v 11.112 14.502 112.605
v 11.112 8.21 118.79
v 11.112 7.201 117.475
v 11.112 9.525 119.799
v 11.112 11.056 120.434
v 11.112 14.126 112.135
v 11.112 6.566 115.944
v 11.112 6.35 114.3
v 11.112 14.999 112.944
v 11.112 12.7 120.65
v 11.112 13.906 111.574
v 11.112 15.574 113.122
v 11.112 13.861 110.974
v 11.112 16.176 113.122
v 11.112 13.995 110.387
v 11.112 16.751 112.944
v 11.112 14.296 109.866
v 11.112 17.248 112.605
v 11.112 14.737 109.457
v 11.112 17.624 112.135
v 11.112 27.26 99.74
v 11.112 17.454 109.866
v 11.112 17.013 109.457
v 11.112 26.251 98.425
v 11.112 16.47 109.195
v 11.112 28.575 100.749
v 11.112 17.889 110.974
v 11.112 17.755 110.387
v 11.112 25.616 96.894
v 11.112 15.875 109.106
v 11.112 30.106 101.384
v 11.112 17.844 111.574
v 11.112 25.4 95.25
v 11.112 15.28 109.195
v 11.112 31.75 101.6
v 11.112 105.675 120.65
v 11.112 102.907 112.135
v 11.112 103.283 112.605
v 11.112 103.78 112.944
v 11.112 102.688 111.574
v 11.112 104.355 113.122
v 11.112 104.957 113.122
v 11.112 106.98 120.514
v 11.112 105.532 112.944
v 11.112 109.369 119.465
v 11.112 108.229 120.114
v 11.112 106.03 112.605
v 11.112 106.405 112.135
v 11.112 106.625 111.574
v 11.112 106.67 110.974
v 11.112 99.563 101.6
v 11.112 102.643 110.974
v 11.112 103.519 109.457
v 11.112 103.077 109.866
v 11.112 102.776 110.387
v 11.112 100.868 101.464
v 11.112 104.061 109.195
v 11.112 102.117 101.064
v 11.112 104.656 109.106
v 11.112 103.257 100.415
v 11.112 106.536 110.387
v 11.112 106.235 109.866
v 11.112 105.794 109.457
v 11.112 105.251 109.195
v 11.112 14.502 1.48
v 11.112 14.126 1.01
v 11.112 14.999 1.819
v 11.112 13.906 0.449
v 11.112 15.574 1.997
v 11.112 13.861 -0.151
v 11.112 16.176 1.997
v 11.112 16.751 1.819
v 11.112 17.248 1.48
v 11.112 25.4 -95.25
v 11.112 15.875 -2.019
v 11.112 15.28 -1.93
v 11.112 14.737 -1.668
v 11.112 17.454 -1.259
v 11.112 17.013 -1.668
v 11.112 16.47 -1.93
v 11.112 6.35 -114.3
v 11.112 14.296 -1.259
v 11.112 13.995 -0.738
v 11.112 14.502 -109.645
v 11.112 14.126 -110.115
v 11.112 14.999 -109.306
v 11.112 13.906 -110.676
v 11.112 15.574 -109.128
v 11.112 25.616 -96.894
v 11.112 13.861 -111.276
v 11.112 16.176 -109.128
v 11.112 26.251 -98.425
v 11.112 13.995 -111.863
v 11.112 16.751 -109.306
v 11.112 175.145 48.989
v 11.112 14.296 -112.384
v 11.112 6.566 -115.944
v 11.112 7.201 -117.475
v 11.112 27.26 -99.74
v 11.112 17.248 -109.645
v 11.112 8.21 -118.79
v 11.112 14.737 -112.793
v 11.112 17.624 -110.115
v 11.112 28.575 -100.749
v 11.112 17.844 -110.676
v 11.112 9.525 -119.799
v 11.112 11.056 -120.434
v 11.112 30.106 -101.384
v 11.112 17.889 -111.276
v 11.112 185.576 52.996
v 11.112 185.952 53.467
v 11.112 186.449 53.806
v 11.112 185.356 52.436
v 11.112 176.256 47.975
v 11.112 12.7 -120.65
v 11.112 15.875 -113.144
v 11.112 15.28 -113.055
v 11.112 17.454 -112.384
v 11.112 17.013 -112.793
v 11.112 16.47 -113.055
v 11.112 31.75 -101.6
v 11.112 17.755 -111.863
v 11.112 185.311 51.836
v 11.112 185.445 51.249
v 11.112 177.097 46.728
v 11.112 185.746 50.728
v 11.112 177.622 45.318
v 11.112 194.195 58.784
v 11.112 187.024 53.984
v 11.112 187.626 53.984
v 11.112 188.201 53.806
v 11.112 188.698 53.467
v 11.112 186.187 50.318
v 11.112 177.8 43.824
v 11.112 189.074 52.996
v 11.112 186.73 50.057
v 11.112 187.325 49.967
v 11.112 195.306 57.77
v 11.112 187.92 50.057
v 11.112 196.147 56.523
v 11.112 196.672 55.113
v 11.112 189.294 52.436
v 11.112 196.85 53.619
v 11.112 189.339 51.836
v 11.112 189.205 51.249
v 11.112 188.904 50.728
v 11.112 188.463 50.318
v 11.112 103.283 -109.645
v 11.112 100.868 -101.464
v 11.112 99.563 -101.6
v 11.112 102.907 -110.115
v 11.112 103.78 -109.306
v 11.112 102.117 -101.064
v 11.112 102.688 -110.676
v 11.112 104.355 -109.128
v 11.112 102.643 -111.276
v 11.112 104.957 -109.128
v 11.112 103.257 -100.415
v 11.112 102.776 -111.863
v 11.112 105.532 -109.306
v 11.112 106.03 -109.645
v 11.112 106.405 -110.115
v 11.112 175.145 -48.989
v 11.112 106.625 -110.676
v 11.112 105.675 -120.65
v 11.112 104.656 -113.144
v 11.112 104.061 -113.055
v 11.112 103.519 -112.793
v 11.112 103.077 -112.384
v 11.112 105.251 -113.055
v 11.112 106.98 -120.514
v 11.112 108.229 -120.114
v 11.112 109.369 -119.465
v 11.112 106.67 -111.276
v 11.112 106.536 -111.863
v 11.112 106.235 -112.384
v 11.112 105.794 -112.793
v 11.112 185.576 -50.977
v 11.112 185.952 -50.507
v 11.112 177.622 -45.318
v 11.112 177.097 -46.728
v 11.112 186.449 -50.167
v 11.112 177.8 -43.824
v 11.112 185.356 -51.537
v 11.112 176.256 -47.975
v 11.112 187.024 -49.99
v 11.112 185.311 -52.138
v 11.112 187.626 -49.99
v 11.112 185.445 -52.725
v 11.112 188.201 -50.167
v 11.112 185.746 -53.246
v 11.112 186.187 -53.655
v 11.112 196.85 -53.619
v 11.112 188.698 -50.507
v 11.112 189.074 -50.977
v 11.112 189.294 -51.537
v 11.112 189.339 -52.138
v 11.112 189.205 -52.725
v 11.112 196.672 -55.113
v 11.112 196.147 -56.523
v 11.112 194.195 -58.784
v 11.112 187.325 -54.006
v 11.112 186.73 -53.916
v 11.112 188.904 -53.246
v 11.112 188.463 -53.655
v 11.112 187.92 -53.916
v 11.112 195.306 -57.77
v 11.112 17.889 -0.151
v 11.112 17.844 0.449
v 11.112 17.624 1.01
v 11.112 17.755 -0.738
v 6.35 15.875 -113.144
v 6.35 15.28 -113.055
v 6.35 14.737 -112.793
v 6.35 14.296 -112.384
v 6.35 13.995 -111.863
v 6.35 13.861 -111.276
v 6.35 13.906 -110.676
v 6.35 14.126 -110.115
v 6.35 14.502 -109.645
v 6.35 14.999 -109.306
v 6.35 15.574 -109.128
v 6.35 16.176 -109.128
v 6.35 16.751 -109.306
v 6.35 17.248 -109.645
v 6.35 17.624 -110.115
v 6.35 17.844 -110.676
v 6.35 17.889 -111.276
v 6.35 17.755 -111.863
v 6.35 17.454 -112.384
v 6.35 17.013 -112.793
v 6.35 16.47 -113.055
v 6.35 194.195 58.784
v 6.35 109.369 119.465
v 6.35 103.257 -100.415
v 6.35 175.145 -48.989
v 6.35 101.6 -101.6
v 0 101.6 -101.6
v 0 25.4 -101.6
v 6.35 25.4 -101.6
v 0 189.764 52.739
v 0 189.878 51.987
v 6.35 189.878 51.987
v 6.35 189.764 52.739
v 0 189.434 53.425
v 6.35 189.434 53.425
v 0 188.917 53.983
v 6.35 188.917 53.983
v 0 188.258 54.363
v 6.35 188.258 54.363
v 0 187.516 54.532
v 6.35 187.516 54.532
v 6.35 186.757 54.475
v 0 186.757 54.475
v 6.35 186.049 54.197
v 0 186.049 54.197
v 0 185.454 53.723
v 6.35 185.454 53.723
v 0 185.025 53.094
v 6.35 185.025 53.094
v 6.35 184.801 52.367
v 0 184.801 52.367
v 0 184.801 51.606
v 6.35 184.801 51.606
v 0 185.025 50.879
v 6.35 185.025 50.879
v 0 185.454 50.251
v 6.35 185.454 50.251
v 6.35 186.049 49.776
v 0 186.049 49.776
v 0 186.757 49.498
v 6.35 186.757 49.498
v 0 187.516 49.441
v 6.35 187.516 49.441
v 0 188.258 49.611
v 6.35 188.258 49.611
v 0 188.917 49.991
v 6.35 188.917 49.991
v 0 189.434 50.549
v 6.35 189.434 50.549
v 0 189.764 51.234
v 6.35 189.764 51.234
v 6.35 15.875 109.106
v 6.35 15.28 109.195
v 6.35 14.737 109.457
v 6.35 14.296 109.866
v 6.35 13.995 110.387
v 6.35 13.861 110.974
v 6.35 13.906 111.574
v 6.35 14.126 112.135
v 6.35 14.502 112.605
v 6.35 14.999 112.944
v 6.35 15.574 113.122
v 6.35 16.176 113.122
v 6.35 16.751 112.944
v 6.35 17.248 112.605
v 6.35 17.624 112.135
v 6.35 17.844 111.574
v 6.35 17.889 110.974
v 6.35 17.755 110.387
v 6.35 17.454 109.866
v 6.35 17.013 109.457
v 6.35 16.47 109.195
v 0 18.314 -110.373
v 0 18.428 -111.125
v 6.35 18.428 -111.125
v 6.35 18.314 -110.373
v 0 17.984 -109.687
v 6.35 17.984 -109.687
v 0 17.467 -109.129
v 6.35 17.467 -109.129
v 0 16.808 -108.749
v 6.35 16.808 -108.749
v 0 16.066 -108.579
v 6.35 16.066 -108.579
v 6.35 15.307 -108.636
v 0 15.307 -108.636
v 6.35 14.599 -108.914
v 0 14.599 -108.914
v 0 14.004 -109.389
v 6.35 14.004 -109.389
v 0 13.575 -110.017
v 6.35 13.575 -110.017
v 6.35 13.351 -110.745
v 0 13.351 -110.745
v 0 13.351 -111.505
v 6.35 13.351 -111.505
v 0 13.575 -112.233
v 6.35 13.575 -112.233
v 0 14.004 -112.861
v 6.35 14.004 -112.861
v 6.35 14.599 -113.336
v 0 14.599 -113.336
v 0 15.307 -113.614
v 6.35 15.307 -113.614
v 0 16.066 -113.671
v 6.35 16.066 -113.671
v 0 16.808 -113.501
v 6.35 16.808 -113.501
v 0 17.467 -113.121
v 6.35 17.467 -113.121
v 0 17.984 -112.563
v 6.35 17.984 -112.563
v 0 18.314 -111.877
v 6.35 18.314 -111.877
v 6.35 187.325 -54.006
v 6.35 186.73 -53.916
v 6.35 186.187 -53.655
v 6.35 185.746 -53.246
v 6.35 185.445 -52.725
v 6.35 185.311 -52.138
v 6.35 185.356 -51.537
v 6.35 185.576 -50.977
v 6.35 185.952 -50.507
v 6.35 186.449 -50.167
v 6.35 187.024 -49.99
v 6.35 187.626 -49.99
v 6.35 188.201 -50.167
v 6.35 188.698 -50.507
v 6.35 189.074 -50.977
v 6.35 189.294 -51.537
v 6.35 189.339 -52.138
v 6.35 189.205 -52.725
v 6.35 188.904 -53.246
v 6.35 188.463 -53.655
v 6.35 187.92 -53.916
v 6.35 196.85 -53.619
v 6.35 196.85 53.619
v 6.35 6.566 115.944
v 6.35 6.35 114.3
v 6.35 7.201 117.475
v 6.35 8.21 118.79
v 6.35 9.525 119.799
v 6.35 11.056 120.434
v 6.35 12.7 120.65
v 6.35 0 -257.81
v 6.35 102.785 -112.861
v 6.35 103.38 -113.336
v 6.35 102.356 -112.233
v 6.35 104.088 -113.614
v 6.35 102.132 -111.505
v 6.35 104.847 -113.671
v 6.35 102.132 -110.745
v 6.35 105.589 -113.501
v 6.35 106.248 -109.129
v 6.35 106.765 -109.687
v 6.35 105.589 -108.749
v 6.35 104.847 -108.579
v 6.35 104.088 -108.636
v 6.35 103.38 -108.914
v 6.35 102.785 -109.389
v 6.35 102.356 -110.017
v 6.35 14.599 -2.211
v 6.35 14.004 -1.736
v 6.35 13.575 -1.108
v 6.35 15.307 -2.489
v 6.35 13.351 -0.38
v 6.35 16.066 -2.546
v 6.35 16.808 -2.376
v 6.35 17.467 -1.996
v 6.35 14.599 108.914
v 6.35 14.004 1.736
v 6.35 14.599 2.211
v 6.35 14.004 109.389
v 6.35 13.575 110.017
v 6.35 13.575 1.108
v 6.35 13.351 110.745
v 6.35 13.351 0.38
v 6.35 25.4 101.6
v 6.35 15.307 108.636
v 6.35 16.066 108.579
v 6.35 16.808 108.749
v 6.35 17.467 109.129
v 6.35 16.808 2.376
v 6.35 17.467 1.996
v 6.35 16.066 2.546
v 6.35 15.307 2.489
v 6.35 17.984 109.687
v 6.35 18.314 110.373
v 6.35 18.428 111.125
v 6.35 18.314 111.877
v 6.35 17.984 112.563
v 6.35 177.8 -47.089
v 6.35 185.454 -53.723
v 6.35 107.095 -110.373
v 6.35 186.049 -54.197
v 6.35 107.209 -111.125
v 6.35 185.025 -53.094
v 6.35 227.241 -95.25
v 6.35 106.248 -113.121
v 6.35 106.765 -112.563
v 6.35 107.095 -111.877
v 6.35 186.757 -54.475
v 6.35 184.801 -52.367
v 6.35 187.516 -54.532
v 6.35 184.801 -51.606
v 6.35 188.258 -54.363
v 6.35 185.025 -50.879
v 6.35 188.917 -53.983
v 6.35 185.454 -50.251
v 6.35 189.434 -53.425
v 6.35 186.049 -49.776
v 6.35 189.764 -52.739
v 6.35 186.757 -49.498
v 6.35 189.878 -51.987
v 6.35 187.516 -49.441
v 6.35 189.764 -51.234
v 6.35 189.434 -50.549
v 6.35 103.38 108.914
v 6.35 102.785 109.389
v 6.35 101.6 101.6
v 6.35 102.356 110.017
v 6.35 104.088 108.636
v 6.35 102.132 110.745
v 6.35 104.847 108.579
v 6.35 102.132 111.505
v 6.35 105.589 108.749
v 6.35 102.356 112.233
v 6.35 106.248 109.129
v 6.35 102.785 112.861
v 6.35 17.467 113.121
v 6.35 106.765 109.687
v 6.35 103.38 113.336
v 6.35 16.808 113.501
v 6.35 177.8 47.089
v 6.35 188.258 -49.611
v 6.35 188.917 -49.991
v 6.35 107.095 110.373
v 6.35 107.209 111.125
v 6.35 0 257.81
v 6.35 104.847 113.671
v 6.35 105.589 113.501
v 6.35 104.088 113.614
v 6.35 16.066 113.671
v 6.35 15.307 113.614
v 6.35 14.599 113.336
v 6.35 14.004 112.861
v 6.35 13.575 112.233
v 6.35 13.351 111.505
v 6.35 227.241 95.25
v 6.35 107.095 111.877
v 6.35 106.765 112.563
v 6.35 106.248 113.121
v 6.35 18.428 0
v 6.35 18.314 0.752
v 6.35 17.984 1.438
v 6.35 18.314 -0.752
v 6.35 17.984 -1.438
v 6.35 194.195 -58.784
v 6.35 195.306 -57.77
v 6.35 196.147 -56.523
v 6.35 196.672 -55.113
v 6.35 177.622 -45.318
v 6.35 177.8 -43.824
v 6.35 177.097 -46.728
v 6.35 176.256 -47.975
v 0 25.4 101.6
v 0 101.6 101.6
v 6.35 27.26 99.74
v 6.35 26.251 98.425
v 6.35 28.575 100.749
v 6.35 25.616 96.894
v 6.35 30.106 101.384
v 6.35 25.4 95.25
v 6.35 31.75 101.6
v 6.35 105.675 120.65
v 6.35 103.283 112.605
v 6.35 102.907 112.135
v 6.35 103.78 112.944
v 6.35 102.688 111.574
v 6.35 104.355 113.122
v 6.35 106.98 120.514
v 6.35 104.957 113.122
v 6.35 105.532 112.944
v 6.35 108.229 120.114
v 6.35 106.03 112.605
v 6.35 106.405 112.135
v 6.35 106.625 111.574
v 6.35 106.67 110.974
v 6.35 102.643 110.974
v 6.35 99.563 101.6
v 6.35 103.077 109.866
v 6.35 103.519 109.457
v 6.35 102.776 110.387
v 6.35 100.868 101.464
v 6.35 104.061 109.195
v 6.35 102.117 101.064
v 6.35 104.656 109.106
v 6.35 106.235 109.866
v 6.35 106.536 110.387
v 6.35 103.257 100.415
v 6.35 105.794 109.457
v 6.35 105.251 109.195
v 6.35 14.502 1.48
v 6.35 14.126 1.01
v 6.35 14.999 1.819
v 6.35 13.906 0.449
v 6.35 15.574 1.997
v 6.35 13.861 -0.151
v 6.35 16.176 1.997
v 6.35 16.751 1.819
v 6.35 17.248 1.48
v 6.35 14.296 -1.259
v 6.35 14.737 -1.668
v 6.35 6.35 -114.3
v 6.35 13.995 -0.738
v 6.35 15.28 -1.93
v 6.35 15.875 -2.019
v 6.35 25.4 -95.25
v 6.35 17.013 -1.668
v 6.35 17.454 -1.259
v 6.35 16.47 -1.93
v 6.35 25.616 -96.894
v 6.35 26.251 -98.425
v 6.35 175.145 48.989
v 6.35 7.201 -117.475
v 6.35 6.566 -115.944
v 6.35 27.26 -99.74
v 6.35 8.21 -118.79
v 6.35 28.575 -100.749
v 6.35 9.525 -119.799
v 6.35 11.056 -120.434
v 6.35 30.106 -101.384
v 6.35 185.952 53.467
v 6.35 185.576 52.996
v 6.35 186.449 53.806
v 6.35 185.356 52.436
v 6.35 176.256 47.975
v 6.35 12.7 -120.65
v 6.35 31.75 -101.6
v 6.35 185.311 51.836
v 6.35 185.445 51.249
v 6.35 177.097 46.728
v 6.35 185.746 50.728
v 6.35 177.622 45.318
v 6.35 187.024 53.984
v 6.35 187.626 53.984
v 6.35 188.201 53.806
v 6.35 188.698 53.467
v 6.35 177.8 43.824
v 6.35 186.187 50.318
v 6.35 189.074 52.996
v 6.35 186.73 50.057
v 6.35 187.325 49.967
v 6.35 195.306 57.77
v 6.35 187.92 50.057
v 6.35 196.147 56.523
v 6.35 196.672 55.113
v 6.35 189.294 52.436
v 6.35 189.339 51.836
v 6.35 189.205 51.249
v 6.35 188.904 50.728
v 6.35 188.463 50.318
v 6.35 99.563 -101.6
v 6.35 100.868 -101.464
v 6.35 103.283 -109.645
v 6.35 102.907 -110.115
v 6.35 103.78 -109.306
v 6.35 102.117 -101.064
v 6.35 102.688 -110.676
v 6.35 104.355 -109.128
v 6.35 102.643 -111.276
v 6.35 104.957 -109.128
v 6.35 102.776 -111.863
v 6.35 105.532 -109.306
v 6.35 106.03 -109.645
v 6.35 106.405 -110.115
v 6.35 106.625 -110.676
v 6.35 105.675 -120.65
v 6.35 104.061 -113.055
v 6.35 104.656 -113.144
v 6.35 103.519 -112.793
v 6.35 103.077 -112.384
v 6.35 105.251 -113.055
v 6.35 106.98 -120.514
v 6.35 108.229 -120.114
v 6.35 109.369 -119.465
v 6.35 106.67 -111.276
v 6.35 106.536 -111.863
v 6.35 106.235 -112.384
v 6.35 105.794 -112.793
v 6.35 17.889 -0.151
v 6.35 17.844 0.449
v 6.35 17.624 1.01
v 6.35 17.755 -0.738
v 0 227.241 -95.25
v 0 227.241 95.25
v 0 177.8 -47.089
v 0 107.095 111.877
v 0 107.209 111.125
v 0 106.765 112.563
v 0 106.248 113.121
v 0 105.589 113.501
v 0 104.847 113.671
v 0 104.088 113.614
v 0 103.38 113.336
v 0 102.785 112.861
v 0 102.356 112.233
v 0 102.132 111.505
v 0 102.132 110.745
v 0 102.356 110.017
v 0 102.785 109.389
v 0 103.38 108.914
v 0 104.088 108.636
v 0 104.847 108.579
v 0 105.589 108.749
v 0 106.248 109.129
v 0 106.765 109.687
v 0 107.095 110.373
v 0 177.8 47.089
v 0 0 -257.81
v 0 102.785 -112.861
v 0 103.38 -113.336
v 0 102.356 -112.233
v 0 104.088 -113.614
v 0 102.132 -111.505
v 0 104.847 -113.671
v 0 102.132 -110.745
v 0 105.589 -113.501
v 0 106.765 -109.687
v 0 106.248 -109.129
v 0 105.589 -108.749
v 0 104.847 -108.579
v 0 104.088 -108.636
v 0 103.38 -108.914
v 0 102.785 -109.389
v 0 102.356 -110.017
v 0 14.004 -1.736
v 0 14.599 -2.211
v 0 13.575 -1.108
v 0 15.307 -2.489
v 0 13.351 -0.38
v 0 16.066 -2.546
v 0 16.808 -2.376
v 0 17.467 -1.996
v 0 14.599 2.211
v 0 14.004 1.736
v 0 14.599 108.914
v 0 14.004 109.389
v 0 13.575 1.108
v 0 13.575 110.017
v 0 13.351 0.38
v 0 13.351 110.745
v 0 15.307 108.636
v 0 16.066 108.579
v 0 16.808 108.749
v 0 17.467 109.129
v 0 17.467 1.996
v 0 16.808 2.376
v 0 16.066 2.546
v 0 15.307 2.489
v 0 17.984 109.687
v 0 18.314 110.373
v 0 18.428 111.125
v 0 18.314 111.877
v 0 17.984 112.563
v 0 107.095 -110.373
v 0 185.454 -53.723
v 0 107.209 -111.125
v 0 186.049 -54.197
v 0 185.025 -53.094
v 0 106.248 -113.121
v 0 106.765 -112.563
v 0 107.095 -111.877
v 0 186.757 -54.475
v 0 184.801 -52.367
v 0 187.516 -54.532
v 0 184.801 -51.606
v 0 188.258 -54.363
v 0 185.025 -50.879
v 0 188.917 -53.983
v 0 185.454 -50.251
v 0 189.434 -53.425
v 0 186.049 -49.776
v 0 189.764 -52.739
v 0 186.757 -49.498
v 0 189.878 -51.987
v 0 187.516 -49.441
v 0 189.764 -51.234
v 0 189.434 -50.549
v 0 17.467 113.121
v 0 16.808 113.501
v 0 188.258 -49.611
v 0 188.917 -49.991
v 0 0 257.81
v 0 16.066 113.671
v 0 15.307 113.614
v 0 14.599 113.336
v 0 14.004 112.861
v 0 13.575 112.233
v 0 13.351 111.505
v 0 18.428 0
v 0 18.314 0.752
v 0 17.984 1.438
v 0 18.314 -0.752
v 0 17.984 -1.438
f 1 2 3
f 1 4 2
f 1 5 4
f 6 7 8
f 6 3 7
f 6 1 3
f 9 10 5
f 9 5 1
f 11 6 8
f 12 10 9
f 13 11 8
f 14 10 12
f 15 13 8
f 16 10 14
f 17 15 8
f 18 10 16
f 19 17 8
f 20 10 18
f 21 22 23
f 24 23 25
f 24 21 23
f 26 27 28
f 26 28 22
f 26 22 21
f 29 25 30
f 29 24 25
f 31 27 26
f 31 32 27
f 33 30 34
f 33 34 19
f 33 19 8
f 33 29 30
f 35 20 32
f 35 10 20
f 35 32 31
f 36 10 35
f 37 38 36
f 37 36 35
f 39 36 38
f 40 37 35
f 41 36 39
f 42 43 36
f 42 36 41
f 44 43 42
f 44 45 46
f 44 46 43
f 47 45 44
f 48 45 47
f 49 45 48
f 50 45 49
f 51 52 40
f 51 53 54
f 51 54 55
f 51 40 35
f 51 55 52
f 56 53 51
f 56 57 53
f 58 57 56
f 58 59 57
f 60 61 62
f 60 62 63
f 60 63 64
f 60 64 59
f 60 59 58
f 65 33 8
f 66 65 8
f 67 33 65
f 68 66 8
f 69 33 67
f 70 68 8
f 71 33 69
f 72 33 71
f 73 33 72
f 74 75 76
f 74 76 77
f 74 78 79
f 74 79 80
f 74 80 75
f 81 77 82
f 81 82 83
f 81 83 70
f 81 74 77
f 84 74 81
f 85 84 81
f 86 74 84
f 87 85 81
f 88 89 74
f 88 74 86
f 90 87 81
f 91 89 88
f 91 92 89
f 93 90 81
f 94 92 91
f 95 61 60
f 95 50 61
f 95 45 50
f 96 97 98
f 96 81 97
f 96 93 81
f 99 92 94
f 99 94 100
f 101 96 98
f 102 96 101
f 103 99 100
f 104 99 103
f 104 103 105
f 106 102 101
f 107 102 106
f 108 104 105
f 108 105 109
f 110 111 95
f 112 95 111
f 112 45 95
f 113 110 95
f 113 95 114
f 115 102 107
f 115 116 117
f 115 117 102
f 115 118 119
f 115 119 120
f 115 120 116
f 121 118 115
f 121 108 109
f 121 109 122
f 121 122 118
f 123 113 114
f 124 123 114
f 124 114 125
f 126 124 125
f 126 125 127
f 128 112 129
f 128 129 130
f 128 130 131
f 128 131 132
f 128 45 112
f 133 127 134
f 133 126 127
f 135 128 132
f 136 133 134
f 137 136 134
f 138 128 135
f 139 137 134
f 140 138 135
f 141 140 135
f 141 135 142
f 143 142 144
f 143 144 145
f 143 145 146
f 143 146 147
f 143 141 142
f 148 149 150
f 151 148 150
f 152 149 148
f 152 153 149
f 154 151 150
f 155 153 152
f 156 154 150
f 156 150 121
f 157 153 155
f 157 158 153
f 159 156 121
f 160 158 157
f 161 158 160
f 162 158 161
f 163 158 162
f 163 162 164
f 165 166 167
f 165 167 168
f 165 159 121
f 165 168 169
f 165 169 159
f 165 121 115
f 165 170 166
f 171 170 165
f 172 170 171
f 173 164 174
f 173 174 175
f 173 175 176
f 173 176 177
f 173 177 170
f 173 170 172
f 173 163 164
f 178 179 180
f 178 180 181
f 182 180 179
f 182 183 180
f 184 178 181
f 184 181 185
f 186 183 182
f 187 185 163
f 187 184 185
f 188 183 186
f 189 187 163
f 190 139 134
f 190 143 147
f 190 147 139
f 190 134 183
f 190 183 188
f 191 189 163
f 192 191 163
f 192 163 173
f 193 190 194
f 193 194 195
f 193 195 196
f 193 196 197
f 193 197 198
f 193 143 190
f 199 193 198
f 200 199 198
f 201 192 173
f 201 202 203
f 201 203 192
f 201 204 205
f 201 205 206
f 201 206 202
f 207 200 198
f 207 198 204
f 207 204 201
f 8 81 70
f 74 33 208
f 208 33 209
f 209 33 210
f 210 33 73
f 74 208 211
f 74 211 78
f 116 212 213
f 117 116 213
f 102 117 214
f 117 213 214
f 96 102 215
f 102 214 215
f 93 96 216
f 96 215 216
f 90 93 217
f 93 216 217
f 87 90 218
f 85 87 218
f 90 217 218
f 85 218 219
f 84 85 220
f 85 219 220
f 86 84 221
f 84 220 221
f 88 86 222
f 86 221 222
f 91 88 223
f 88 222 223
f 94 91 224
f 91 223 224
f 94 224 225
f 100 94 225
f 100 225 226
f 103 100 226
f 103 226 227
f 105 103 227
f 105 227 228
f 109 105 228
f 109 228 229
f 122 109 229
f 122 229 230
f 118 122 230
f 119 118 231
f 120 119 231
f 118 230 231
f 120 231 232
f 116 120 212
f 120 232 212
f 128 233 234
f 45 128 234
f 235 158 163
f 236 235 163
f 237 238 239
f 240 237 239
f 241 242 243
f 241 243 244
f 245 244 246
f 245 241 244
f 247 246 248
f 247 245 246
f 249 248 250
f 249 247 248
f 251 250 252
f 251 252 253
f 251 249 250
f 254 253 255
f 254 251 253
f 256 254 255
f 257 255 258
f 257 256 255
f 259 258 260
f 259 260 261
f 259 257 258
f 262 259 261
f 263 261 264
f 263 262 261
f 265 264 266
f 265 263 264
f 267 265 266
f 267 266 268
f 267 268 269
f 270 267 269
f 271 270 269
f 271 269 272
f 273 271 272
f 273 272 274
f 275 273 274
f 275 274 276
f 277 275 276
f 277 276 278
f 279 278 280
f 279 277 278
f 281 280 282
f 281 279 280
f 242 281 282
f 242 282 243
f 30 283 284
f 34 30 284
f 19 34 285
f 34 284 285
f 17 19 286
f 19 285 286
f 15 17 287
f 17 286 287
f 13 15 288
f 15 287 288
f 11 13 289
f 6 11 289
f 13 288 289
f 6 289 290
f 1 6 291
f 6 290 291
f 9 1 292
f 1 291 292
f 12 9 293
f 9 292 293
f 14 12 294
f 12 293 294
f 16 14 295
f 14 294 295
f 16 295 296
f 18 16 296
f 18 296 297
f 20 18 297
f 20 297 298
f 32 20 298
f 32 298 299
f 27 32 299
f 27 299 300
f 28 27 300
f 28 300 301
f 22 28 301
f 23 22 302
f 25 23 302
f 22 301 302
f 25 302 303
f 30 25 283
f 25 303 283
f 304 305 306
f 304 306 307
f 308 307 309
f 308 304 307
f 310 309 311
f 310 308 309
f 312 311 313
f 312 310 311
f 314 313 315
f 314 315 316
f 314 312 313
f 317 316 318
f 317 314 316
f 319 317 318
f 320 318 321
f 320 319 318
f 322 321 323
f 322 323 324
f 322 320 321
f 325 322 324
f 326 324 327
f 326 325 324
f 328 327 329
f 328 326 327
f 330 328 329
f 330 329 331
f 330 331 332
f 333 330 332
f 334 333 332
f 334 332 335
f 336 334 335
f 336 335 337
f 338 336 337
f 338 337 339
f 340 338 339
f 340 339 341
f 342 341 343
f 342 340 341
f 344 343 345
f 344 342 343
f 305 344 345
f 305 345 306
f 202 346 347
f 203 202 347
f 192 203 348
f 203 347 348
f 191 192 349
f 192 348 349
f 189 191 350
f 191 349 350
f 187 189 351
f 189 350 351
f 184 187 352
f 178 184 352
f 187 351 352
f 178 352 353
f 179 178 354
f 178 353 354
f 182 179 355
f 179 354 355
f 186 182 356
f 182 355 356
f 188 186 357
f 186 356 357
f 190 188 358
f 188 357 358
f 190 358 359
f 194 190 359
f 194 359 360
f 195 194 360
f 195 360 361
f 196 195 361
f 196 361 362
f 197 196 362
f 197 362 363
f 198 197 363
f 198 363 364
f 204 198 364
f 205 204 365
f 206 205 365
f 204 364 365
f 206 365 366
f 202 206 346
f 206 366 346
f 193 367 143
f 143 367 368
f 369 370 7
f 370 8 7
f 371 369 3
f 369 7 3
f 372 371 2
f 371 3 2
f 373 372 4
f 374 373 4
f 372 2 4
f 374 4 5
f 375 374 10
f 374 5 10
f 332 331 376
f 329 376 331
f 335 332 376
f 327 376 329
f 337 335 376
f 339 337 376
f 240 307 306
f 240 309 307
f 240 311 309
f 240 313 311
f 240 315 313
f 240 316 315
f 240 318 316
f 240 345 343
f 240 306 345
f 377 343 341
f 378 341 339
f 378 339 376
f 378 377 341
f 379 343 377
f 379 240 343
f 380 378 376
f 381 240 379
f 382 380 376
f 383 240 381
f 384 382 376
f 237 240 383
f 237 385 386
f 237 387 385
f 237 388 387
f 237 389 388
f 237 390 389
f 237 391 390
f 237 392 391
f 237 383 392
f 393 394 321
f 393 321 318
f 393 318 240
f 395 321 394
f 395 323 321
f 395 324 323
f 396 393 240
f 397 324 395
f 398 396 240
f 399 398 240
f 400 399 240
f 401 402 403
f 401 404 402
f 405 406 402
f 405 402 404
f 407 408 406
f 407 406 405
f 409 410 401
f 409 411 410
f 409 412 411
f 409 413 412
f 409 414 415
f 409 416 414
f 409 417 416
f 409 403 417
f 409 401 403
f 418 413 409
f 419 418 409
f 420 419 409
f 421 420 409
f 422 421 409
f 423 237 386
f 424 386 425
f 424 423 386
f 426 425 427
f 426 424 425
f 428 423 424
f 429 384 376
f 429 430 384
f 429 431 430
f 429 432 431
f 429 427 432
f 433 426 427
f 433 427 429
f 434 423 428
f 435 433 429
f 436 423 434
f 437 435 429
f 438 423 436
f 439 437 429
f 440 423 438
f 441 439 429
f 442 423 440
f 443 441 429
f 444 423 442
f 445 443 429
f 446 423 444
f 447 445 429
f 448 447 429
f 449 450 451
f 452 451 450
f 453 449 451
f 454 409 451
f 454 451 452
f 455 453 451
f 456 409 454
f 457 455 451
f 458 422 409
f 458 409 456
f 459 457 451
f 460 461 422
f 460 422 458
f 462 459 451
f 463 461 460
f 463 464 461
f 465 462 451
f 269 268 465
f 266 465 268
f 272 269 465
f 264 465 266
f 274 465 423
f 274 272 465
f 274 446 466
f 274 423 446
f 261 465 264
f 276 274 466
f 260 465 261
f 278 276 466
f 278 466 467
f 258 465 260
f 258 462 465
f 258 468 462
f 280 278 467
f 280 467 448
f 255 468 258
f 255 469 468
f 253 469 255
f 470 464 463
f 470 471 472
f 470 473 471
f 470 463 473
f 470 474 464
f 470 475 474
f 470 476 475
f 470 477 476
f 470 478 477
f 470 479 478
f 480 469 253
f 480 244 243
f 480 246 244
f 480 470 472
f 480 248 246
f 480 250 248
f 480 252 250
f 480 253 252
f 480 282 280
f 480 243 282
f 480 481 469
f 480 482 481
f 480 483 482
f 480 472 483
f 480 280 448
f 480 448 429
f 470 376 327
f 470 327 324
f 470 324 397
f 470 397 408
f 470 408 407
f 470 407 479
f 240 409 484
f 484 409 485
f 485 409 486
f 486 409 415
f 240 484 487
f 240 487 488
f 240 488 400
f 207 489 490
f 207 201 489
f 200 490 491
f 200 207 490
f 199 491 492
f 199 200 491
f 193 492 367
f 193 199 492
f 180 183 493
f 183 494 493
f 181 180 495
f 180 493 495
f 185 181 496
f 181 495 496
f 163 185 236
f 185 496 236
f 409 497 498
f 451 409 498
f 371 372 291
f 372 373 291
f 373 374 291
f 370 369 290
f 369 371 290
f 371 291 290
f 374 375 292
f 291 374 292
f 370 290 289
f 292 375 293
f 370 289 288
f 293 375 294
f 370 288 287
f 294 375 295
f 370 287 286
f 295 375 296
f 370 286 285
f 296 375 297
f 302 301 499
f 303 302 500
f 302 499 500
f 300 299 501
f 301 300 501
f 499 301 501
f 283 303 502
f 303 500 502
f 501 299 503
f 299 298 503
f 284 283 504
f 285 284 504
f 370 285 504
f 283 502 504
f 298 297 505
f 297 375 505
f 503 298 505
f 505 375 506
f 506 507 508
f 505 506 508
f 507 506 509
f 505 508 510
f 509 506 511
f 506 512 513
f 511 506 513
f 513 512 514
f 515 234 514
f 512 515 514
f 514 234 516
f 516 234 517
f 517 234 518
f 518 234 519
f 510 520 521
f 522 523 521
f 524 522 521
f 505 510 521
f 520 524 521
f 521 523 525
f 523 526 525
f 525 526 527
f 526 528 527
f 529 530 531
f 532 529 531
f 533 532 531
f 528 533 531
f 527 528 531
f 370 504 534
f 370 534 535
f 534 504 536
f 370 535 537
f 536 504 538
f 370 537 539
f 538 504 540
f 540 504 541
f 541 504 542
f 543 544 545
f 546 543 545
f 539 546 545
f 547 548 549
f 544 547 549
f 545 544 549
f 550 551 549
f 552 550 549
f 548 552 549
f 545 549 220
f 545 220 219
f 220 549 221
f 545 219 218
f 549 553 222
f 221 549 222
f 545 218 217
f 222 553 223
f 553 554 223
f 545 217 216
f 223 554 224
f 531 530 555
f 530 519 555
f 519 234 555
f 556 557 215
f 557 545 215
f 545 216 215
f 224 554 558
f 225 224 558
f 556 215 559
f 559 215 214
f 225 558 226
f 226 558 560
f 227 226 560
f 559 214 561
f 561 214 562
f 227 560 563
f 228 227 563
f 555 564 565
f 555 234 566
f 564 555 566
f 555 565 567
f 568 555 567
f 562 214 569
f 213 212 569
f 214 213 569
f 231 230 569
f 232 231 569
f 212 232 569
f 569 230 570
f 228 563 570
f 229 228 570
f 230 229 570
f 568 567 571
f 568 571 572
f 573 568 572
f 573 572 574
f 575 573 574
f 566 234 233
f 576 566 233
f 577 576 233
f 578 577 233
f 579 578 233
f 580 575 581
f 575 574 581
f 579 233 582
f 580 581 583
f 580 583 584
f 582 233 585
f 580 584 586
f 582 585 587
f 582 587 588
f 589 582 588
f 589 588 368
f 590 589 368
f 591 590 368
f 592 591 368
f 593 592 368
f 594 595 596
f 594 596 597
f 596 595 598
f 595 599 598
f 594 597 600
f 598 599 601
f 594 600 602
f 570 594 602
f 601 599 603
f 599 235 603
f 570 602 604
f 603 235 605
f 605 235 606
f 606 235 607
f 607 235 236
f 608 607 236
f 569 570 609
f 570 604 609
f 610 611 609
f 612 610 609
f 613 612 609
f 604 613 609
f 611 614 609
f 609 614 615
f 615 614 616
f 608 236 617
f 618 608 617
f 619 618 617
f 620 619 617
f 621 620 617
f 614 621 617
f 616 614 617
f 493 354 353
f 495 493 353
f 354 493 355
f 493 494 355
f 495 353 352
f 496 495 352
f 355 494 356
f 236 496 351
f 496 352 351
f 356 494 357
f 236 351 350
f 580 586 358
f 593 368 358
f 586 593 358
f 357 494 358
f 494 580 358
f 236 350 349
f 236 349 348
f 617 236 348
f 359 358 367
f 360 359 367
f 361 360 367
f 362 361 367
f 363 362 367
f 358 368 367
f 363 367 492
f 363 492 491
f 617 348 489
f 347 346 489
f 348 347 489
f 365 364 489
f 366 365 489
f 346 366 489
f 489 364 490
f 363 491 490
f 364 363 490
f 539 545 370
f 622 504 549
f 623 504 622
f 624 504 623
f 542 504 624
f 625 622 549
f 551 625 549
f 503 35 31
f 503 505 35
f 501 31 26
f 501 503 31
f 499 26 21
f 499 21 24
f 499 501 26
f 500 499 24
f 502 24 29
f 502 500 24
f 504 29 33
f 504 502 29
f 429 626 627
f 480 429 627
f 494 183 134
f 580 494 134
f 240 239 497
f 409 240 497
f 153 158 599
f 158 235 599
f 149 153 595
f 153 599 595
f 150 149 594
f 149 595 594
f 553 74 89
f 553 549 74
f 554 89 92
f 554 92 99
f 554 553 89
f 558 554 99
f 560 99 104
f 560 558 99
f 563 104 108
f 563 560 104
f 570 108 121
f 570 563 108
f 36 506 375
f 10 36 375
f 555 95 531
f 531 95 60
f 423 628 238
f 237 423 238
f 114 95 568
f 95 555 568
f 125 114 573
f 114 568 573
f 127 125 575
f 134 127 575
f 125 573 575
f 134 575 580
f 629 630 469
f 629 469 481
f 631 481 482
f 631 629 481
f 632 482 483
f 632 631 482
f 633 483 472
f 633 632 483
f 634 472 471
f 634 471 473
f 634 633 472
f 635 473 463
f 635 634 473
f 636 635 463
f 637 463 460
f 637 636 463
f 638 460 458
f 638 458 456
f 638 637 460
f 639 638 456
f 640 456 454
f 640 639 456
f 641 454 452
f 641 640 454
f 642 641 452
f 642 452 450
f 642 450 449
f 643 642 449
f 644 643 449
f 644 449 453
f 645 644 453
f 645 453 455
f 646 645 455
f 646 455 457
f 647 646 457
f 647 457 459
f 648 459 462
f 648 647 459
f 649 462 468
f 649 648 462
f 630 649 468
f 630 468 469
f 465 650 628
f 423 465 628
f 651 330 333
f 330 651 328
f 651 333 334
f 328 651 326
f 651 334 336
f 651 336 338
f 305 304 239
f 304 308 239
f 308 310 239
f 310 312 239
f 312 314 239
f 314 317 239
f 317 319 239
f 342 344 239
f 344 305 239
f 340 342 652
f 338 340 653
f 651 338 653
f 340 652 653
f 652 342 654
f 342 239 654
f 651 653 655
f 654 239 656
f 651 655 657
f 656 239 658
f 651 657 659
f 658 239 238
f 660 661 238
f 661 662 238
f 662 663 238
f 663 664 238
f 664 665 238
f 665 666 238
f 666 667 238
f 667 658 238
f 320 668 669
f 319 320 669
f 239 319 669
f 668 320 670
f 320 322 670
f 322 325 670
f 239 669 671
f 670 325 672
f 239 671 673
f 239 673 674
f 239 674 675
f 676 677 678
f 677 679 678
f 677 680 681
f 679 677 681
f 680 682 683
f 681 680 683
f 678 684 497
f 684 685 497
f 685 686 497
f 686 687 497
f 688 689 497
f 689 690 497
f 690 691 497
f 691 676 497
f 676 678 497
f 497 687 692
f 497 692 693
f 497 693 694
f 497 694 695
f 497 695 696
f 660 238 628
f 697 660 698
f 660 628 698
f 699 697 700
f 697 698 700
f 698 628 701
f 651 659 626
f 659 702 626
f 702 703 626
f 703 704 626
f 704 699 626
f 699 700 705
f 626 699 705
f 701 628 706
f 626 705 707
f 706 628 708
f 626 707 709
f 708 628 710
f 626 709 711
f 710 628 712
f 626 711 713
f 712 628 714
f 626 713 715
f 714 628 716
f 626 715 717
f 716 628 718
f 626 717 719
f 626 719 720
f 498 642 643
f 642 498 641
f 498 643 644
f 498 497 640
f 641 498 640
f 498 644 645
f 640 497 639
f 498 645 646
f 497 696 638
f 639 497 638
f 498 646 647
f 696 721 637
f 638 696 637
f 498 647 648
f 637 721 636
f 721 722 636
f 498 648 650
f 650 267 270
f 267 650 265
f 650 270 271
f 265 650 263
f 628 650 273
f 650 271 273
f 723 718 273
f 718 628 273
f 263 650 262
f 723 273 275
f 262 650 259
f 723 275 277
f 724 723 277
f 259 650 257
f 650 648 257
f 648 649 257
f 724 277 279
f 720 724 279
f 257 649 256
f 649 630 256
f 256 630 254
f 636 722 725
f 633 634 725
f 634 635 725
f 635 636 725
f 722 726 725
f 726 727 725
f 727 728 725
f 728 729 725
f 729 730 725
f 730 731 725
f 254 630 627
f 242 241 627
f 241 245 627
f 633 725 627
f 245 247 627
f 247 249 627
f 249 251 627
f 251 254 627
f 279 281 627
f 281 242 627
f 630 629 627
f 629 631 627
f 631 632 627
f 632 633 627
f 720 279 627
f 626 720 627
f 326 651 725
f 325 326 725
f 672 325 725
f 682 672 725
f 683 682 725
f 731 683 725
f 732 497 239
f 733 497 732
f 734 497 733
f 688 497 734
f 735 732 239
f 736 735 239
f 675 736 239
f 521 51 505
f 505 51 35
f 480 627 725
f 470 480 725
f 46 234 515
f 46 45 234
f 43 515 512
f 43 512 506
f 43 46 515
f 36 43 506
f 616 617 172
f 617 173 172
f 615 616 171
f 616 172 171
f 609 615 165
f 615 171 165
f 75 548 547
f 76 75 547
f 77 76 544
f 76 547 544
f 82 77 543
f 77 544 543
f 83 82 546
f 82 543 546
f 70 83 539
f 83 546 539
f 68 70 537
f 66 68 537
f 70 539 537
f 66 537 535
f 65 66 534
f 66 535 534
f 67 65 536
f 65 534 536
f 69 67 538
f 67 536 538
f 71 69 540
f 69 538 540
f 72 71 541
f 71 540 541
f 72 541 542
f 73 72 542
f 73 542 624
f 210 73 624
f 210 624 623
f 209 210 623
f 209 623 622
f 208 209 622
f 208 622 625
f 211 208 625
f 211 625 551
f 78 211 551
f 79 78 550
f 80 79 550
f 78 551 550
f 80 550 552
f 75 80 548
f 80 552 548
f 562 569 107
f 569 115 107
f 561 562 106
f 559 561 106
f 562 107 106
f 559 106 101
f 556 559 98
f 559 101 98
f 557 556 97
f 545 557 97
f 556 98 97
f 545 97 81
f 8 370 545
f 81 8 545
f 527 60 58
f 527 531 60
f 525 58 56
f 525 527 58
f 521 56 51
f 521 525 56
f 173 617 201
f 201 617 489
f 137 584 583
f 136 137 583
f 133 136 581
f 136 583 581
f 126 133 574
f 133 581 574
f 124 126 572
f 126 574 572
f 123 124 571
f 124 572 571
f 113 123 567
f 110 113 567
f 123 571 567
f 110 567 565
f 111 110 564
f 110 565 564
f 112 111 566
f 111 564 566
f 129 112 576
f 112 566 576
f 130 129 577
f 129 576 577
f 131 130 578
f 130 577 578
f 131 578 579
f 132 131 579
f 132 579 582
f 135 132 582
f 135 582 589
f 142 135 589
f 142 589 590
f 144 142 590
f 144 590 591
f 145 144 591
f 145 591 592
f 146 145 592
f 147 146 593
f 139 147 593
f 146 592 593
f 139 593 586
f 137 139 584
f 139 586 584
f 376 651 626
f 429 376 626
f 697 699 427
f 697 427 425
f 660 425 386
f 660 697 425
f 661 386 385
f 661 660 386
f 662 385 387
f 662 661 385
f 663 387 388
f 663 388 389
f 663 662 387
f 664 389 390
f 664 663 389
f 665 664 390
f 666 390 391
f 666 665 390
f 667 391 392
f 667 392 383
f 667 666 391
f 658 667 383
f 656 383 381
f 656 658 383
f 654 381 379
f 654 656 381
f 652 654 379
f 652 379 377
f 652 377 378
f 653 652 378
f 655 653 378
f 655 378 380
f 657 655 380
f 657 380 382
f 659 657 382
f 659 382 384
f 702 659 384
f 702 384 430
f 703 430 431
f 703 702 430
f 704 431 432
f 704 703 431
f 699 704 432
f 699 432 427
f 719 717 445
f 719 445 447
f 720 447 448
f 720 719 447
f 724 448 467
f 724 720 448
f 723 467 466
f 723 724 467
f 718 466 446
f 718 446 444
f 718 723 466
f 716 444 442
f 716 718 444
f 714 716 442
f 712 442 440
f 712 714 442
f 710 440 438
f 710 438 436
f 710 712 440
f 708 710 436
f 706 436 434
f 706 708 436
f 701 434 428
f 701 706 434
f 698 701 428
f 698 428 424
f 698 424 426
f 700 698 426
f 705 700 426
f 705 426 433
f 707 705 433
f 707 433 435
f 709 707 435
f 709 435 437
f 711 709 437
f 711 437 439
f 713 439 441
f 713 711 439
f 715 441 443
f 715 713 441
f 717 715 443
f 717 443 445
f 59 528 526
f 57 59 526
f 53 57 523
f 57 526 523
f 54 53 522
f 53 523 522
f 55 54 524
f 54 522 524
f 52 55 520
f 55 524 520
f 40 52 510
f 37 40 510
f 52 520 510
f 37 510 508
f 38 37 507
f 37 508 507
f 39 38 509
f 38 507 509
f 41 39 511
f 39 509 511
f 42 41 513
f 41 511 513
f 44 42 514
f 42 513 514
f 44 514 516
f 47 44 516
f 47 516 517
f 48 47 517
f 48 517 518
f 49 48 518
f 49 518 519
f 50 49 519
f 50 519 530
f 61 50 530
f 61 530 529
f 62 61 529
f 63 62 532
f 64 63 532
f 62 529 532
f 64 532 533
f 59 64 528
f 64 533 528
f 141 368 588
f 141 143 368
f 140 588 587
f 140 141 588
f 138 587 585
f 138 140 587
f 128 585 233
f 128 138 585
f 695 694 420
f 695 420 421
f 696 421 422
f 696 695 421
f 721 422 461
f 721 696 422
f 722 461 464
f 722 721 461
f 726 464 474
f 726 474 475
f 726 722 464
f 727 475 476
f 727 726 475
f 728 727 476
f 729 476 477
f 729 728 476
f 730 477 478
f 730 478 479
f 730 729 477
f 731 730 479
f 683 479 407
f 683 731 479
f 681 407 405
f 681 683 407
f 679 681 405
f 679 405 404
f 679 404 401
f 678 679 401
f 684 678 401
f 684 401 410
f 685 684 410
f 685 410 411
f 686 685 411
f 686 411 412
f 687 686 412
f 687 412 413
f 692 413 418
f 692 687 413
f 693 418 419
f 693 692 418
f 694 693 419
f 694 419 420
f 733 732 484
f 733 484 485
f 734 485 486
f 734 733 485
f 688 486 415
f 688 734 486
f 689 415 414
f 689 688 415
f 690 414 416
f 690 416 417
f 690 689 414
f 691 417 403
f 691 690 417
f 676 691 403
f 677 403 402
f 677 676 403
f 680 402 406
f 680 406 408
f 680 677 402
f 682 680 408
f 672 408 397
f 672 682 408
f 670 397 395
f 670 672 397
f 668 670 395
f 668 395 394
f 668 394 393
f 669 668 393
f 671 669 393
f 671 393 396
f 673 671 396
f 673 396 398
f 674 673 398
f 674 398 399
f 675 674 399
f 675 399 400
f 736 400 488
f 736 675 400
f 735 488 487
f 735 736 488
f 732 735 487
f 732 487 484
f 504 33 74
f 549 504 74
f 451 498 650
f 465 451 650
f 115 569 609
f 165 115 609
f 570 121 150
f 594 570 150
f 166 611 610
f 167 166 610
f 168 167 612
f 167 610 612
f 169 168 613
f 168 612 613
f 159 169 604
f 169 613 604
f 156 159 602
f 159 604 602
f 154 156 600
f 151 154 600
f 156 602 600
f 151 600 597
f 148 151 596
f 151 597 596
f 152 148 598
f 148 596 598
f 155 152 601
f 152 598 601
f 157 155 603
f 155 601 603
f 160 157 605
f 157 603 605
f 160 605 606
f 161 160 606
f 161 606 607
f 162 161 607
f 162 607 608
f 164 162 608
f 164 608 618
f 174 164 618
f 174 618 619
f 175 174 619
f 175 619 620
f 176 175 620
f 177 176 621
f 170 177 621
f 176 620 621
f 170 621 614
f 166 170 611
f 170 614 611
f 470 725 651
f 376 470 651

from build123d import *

# Parameters (mm, degrees)
ANGLEDBALLAST_DECKFRONT_OUTLINE_R = 2.5527
ANGLEDBALLAST_DECKFRONT_DEPTH     = 6.35
BOSS_EXTRUDE1_DEPTH               = 4.7625
CUT_EXTRUDE2_DEPTH                = 344.843118524
SKETCH6_W                         = 2.0193
SKETCH6_H                         = 11.1125
F_10_32_TAPPED_HOLE1_AT_2_COUNT   = 2
F_10_32_TAPPED_HOLE1_AT_2_PITCH   = 88.781174089
F_10_32_TAPPED_HOLE1_AT_3_COUNT   = 2
F_10_32_TAPPED_HOLE1_AT_3_PITCH   = 181.362705212
F_10_32_TAPPED_HOLE1_AT_4_COUNT   = 2
F_10_32_TAPPED_HOLE1_AT_4_PITCH   = 236.644368766
F_10_32_TAPPED_HOLE1_AT_5_COUNT   = 2
F_10_32_TAPPED_HOLE1_AT_5_PITCH   = 239.326470272
F_10_32_TAPPED_HOLE1_AT_6_COUNT   = 2
F_10_32_TAPPED_HOLE1_AT_6_PITCH   = 222.25
F_10_32_TAPPED_HOLE1_AT_7_COUNT   = 2
F_10_32_TAPPED_HOLE1_AT_7_PITCH   = 111.125
FILLET1_R                         = 6.35


# Read off the part's stored shape, not the designer's step: AngledBallast_DeckFront
with BuildPart() as part:
    # AngledBallast_DeckFront outline → AngledBallast_DeckFront (new body)
    with BuildSketch(Plane.YZ):
        Polygon((227.241295543, 95.25), (0, 257.81), (0, -257.81), (227.241295543, -95.25), align=None)
        with Locations((15.875, -111.125)):
            Circle(ANGLEDBALLAST_DECKFRONT_OUTLINE_R, mode=Mode.SUBTRACT)
        with Locations((104.656174089, -111.125)):
            Circle(ANGLEDBALLAST_DECKFRONT_OUTLINE_R, mode=Mode.SUBTRACT)
        with Locations((187.325, -51.986786112)):
            Circle(ANGLEDBALLAST_DECKFRONT_OUTLINE_R, mode=Mode.SUBTRACT)
        with Locations((15.875, 0)):
            Circle(ANGLEDBALLAST_DECKFRONT_OUTLINE_R, mode=Mode.SUBTRACT)
        with Locations((15.875, 111.125)):
            Circle(ANGLEDBALLAST_DECKFRONT_OUTLINE_R, mode=Mode.SUBTRACT)
        Polygon((101.6, -101.6), (25.4, -101.6), (25.4, 101.6), (101.6, 101.6), (177.8, 47.089344398), (177.8, -47.089344398), align=None, mode=Mode.SUBTRACT)
        with Locations((104.656174089, 111.125)):
            Circle(ANGLEDBALLAST_DECKFRONT_OUTLINE_R, mode=Mode.SUBTRACT)
        with Locations((187.325, 51.986786112)):
            Circle(ANGLEDBALLAST_DECKFRONT_OUTLINE_R, mode=Mode.SUBTRACT)
    extrude(amount=ANGLEDBALLAST_DECKFRONT_DEPTH)


with BuildPart() as body_2:
    # Sketch1 → Boss-Extrude1 (new body)
    with BuildSketch(Plane(origin=(6.35, 0, 0), x_dir=(0, 0, -1), z_dir=(1, 0, 0))):
        Polygon((120.65, 107.712348179), (56.884227826, 196.85), (-56.884227826, 196.85), (-120.65, 107.712348179), (-120.65, 6.35), (120.65, 6.35), align=None)
    extrude(amount=BOSS_EXTRUDE1_DEPTH)

    # Sketch4 → Cut-Extrude2 (cut, through all)
    with BuildSketch(Plane(origin=(11.1125, 0, 0), x_dir=(0, 0, -1), z_dir=(1, 0, 0))):
        Polygon((-47.089344398, 177.8), (-101.6, 101.6), (-101.6, 25.4), (101.6, 25.4), (101.6, 101.6), (47.089344398, 177.8), align=None)
    extrude(amount=-CUT_EXTRUDE2_DEPTH, mode=Mode.SUBTRACT)

    # Sketch6 → #10-32 Tapped Hole1 (revolve, cut)
    with BuildSketch(Plane(origin=(11.1125, 15.875, 111.125), x_dir=(0, 0, -1), z_dir=(0, 1, 0))):
        with Locations((1.00965, 5.55625)):
            Rectangle(SKETCH6_W, SKETCH6_H)
    f_10_32_tapped_hole1 = revolve(axis=Axis((17.4625, 15.875, 111.125), (-1, 0, 0)), mode=Mode.SUBTRACT)

    # #10-32 Tapped Hole1 at 2: #10-32 Tapped Hole1 ×2
    with Locations(*[(0, i * F_10_32_TAPPED_HOLE1_AT_2_PITCH, 0) for i in range(1, F_10_32_TAPPED_HOLE1_AT_2_COUNT)]):
        add(f_10_32_tapped_hole1, mode=Mode.SUBTRACT)

    # #10-32 Tapped Hole1 at 3: #10-32 Tapped Hole1 ×2
    with Locations(*[Vector(0, 0.9453431994157798, -0.3260770389315034) * (i * F_10_32_TAPPED_HOLE1_AT_3_PITCH) for i in range(1, F_10_32_TAPPED_HOLE1_AT_3_COUNT)]):
        add(f_10_32_tapped_hole1, mode=Mode.SUBTRACT)

    # #10-32 Tapped Hole1 at 4: #10-32 Tapped Hole1 ×2
    with Locations(*[Vector(0, 0.7245048800195719, -0.6892696706136328) * (i * F_10_32_TAPPED_HOLE1_AT_4_PITCH) for i in range(1, F_10_32_TAPPED_HOLE1_AT_4_COUNT)]):
        add(f_10_32_tapped_hole1, mode=Mode.SUBTRACT)

    # #10-32 Tapped Hole1 at 5: #10-32 Tapped Hole1 ×2
    with Locations(*[Vector(0, 0.37096261850402434, -0.928647799584233) * (i * F_10_32_TAPPED_HOLE1_AT_5_PITCH) for i in range(1, F_10_32_TAPPED_HOLE1_AT_5_COUNT)]):
        add(f_10_32_tapped_hole1, mode=Mode.SUBTRACT)

    # #10-32 Tapped Hole1 at 6: #10-32 Tapped Hole1 ×2
    with Locations(*[(0, 0, -i * F_10_32_TAPPED_HOLE1_AT_6_PITCH) for i in range(1, F_10_32_TAPPED_HOLE1_AT_6_COUNT)]):
        add(f_10_32_tapped_hole1, mode=Mode.SUBTRACT)

    # #10-32 Tapped Hole1 at 7: #10-32 Tapped Hole1 ×2
    with Locations(*[(0, 0, -i * F_10_32_TAPPED_HOLE1_AT_7_PITCH) for i in range(1, F_10_32_TAPPED_HOLE1_AT_7_COUNT)]):
        add(f_10_32_tapped_hole1, mode=Mode.SUBTRACT)

    # Fillet1
    fillet1_edges = [body_2.edges().sort_by_distance(p)[0] for p in [
        (8.73125, 196.85, 56.884227826),
        (8.73125, 196.85, -56.884227826),
        (8.73125, 107.712348179, -120.65),
        (8.73125, 6.35, -120.65),
        (8.73125, 6.35, 120.65),
        (8.73125, 107.712348179, 120.65),
        (8.73125, 177.8, 47.089344398),
        (8.73125, 177.8, -47.089344398),
        (8.73125, 101.6, -101.6),
        (8.73125, 25.4, -101.6),
        (8.73125, 25.4, 101.6),
        (8.73125, 101.6, 101.6),
    ]]
    fillet(fillet1_edges, radius=FILLET1_R)


solid = Compound([part.part, body_2.part])
